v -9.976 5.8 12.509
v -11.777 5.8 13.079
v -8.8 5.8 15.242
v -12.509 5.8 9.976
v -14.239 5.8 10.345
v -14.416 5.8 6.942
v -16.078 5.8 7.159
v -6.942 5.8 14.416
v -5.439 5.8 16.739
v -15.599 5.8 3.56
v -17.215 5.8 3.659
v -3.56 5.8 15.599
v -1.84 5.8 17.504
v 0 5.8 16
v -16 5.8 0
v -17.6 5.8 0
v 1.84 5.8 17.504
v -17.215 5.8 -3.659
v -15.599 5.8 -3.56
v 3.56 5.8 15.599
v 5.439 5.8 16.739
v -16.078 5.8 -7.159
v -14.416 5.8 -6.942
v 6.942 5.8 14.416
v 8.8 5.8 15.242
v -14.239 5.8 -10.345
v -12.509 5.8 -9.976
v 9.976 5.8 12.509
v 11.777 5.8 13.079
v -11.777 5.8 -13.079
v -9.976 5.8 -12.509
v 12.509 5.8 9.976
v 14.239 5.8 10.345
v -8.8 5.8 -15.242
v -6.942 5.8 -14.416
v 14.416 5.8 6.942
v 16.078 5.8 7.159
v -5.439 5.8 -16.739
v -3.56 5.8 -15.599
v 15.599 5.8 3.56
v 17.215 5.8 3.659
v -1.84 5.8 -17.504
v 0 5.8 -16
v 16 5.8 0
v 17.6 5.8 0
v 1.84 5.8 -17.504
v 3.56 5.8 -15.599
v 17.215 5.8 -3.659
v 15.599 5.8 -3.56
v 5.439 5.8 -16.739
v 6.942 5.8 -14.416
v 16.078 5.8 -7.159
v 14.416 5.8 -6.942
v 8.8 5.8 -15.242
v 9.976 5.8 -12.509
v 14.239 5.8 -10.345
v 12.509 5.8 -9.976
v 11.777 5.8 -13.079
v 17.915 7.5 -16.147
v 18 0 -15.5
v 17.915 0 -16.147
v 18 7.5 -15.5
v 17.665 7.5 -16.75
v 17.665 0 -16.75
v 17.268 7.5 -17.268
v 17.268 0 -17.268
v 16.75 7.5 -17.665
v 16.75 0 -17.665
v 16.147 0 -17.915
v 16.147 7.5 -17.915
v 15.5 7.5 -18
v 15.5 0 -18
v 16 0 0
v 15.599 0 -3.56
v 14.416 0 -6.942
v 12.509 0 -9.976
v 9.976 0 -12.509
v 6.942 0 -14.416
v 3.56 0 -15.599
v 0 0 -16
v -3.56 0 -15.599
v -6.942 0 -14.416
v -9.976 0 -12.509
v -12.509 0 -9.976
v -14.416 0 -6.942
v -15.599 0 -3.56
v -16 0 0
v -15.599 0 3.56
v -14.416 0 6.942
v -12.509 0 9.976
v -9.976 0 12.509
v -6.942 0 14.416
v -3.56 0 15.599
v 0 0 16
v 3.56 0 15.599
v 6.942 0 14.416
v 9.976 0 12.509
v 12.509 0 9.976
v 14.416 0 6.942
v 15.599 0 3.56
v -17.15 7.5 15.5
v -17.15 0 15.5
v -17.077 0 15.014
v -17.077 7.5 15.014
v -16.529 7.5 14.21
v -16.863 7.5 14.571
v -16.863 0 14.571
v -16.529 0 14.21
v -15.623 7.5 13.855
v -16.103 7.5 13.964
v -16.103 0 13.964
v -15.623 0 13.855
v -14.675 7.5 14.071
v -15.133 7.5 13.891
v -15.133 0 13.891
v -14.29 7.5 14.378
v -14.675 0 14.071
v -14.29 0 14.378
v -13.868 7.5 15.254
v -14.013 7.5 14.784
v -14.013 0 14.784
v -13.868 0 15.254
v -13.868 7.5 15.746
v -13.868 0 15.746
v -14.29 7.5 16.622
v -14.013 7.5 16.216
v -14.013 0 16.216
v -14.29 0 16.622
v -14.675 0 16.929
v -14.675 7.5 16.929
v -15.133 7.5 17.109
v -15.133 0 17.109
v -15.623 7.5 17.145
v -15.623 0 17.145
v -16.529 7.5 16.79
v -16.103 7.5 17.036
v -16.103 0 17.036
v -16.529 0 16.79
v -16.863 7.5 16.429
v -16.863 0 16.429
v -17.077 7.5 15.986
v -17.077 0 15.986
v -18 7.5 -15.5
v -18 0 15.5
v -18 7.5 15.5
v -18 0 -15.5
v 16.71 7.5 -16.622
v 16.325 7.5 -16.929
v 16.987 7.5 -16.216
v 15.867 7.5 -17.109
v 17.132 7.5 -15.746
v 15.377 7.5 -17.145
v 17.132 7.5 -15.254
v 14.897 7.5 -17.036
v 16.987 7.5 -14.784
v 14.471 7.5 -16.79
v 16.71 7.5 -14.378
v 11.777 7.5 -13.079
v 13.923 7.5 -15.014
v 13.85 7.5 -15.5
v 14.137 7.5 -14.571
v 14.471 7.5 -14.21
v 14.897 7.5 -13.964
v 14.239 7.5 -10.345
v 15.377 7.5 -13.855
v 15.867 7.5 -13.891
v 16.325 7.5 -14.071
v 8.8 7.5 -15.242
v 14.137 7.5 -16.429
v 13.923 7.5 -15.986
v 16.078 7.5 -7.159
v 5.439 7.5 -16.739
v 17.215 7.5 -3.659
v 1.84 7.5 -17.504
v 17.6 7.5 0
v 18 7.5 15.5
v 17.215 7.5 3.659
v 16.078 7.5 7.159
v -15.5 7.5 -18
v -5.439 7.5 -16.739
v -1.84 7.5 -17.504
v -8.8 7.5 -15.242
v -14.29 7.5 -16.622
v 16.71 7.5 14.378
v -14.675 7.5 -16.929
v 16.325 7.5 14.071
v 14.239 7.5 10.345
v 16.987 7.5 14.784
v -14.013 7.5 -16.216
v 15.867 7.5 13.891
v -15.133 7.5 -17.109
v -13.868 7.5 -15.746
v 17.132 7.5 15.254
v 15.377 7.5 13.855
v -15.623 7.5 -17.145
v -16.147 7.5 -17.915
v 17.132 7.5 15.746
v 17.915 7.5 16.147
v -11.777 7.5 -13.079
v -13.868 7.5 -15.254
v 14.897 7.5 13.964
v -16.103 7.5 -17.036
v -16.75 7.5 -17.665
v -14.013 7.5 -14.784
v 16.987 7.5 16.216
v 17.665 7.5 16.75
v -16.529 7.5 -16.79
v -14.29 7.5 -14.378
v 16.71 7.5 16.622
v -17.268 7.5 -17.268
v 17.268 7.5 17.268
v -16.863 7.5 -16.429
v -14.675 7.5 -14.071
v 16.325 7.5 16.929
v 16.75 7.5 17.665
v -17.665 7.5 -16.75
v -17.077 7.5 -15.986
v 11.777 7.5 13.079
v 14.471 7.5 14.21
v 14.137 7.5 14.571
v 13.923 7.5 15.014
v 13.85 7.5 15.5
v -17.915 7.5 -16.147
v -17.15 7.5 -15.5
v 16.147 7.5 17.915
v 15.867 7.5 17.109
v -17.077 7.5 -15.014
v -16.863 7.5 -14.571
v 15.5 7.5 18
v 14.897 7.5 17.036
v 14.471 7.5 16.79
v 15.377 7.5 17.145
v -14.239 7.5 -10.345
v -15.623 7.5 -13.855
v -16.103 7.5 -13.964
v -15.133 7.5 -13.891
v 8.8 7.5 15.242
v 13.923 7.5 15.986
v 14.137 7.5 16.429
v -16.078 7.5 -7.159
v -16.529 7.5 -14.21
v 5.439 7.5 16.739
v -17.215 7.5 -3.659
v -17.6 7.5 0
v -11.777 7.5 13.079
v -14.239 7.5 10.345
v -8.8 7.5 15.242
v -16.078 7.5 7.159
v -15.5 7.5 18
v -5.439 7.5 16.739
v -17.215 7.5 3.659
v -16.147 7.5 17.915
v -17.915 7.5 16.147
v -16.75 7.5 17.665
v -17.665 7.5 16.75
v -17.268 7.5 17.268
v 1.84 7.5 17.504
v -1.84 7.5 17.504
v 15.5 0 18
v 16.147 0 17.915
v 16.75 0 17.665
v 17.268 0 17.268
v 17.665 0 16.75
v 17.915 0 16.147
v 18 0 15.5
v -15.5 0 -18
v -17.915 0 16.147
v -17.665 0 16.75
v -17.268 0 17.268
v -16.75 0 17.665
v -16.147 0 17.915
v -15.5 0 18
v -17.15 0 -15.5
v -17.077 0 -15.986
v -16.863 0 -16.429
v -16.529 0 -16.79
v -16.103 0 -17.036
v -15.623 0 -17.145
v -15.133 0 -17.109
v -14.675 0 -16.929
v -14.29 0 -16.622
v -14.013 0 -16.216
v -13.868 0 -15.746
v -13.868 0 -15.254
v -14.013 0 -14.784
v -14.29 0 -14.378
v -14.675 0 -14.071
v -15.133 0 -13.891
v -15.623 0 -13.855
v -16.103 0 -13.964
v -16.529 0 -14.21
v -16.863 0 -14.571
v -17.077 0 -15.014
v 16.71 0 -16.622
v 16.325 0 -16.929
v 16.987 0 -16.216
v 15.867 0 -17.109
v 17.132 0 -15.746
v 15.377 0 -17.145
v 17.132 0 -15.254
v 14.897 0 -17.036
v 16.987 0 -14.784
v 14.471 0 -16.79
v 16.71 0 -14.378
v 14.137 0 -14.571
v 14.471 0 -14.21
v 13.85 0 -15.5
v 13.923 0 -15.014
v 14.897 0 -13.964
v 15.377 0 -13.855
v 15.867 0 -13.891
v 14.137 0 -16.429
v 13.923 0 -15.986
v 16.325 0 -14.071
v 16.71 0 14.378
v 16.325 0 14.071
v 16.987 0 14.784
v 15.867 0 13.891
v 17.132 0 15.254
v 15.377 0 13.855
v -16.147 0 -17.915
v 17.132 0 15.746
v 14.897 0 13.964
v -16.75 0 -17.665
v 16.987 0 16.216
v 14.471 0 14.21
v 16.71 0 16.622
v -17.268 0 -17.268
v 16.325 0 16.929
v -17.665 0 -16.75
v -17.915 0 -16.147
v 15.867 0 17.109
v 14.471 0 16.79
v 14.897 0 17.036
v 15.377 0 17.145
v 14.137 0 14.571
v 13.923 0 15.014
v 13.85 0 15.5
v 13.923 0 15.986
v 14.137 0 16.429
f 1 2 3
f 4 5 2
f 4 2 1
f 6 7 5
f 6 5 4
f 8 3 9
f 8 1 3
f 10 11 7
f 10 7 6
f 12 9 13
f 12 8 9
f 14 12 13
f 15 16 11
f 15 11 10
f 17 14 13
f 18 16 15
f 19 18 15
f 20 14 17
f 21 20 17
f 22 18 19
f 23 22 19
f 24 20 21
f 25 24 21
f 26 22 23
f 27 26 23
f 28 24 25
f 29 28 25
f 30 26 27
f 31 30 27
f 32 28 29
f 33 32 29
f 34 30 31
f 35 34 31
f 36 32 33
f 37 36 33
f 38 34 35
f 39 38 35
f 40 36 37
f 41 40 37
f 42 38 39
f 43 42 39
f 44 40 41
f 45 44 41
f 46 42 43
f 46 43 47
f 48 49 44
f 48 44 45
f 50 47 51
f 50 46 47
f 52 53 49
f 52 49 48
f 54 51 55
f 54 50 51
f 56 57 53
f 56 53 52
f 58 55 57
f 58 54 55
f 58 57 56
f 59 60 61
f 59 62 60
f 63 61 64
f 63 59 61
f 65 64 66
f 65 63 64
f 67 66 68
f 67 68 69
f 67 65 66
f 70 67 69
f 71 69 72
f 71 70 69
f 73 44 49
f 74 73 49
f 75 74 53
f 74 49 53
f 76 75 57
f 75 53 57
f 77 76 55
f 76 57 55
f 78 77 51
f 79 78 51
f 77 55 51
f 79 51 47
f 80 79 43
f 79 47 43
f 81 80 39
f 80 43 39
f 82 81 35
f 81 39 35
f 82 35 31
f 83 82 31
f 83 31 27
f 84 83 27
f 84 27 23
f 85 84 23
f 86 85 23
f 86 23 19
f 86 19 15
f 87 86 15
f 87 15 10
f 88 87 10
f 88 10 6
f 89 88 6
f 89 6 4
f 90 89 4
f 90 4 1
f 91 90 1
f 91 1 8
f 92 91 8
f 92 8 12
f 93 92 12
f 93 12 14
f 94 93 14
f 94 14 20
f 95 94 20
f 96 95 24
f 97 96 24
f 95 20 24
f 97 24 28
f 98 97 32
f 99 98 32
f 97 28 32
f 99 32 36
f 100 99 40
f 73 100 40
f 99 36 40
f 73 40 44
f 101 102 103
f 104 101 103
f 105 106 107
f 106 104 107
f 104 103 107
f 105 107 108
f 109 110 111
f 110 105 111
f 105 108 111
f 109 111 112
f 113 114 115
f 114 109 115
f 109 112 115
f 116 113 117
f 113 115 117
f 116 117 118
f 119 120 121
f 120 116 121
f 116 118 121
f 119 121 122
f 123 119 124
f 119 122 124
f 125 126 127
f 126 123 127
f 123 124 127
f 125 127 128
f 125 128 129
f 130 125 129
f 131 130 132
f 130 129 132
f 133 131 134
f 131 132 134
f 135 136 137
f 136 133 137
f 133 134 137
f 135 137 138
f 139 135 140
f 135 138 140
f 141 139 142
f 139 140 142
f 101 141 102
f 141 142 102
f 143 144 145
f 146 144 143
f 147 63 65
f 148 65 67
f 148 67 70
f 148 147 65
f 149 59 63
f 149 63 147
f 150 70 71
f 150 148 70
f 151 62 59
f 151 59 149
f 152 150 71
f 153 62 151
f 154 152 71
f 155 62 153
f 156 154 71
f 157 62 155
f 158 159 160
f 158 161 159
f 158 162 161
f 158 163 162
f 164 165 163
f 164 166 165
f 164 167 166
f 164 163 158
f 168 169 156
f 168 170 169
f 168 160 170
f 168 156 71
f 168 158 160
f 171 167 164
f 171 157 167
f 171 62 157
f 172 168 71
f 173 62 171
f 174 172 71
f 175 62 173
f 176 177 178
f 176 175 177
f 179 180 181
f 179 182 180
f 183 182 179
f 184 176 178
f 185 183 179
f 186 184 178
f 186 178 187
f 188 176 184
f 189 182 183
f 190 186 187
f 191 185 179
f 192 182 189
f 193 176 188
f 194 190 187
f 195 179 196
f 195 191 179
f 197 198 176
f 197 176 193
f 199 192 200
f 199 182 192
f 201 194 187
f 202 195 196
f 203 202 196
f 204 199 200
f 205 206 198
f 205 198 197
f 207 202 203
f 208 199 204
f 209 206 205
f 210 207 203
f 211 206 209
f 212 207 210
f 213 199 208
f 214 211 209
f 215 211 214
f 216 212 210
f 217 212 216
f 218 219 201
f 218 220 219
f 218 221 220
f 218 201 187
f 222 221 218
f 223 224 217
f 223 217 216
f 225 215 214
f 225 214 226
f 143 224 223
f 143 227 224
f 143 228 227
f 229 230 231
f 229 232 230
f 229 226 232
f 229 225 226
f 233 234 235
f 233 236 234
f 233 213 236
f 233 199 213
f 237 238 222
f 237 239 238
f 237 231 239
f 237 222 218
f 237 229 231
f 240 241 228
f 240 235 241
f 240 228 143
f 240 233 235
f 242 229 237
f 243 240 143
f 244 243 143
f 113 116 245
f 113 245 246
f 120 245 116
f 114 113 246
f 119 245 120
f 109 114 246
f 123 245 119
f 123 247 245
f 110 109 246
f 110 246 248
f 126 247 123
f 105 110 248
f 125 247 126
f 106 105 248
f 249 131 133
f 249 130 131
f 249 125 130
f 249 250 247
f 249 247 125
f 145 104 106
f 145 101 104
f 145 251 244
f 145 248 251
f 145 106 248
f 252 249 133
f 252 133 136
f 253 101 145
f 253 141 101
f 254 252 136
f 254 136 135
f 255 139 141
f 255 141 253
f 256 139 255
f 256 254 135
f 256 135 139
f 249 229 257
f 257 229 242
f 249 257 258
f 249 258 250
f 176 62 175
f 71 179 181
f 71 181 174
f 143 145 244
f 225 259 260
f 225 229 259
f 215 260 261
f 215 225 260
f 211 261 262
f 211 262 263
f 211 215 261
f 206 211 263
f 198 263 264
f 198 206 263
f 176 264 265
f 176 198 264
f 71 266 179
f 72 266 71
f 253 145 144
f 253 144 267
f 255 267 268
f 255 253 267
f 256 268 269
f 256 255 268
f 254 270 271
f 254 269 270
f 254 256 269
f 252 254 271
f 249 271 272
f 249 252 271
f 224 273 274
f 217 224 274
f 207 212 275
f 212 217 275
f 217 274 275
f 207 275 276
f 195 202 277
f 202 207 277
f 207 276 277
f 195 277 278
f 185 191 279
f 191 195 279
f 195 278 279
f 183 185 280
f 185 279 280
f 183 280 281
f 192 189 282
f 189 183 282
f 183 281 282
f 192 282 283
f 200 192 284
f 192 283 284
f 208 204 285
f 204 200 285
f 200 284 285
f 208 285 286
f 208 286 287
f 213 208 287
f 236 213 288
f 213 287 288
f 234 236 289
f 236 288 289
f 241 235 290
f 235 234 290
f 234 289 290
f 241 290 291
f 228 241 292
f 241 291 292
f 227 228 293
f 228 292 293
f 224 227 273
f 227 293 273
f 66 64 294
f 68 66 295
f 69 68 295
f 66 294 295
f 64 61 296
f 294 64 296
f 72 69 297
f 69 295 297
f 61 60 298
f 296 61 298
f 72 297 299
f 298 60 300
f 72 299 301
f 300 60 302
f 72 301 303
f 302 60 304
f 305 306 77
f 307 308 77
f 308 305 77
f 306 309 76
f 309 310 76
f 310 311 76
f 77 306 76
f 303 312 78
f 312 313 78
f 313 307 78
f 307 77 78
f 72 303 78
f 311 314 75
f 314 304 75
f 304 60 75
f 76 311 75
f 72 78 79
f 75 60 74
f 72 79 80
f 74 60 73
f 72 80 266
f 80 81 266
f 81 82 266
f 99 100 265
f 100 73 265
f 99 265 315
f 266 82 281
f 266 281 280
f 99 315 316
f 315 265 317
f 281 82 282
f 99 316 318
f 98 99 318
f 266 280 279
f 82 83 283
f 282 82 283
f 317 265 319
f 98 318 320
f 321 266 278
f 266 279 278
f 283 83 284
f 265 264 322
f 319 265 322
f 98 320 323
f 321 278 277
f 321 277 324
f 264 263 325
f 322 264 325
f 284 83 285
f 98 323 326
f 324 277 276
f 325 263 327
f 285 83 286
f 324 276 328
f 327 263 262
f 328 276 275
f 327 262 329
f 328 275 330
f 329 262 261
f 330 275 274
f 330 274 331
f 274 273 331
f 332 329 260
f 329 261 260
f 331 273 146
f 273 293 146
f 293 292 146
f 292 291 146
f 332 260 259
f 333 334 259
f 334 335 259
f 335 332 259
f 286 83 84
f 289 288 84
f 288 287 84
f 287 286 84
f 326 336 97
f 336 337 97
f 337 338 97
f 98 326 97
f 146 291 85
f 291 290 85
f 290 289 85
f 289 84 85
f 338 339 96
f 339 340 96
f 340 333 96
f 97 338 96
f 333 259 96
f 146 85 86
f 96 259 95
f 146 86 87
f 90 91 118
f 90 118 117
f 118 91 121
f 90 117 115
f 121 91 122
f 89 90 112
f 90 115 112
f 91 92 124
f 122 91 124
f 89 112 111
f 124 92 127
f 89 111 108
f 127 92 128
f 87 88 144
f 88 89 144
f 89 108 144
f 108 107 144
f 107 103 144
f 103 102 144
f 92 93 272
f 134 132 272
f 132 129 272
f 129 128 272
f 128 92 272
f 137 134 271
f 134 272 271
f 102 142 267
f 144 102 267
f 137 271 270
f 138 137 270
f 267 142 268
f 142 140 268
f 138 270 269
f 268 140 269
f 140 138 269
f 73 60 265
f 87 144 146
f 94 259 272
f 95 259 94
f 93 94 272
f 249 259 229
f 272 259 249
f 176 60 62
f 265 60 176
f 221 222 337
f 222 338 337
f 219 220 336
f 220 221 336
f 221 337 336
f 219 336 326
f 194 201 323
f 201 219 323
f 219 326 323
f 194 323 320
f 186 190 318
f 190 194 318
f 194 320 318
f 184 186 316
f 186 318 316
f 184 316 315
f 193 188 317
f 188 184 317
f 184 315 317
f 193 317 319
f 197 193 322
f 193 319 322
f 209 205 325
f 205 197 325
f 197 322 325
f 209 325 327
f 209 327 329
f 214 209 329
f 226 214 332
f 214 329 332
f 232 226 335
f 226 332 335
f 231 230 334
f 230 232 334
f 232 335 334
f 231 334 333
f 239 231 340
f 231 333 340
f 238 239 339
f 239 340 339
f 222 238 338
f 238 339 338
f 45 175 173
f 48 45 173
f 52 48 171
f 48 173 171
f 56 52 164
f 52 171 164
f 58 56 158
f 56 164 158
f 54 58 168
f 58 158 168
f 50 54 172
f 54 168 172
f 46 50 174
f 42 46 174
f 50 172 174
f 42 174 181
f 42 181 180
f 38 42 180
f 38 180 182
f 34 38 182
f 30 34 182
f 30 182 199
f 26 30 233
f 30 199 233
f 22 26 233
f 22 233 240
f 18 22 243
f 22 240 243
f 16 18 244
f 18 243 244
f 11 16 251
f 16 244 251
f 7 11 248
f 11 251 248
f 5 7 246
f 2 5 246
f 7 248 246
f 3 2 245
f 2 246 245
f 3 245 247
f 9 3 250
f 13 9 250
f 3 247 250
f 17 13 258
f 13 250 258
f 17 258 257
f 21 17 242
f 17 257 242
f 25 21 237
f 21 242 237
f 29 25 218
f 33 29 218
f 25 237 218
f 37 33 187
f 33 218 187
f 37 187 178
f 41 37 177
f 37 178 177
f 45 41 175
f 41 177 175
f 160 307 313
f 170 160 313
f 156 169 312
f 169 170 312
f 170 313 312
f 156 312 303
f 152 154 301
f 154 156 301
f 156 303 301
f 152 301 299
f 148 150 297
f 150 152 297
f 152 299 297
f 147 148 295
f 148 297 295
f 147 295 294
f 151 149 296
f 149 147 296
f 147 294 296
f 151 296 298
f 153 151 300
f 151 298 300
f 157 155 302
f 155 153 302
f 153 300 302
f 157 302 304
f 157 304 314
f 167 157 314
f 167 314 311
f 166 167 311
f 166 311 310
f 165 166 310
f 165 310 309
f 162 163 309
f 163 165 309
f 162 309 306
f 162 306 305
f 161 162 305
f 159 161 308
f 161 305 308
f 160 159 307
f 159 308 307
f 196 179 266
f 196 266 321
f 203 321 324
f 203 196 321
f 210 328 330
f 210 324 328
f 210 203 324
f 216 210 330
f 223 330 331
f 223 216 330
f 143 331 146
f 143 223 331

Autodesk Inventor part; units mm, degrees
ref_plane "YZ Plane" through (0, 0, 0) normal (1, 0, 0) x (0, 1, 0)
ref_plane "XZ Plane" through (0, 0, 0) normal (0, 1, 0) x (-1, 0, 0)
ref_plane "XY Plane" through (0, 0, 0) normal (0, 0, 1) x (1, 0, 0)
sketch "Sketch1" plane through (0, 0, 0) normal (0, 1, 0) x (-1, 0, 0)
  line L0 (-18, 18) -> (18, 18)
  line L1 (18, 18) -> (18, -18)
  line L2 (18, -18) -> (-18, -18)
  line L3 (-18, -18) -> (-18, 18)
  line L4 (-18, 18) -> (18, -18) construction
  line L5 (18, 18) -> (-18, -18) construction
  circle A0 centre (0, 0) radius 16 construction
  circle A1 centre (15.5, 15.5) radius 1.65
  circle A2 centre (15.5, -15.5) radius 1.65
  circle A3 centre (-15.5, -15.5) radius 1.65
  circle A4 centre (-15.5, 15.5) radius 1.65
  circle A5 centre (15.5, 15.5) radius 2.5 construction
  circle A6 centre (15.5, -15.5) radius 2.5
  circle A7 centre (-15.5, -15.5) radius 2.5
  circle A8 centre (-15.5, 15.5) radius 2.5 construction
  point P0 (0, 0)
  dimension "d0" = 36
  dimension "d1" = 36
  dimension "d2" = 32
  dimension "d3" = 3.3
  dimension "d4" = 3.3
  dimension "d5" = 3.3
  dimension "d6" = 5
  dimension "d7" = 5
  dimension "d8" = 5
  dimension "d9" = 5
  dimension "d10" = 3.3
extrude "Extrusion1" add sketch "Sketch1" along normal blind 7.5
fillet "Fillet1" radius 2.5 4 edges at (18, 3.75, 18) (18, 3.75, -18) (-18, 3.75, -18) (-18, 3.75, 18)
sketch "Sketch2" plane through (0, 7.5, 0) normal (0, 1, 0) x (1, 0, 0)
  circle A0 centre (0, 0) radius 17.6
  dimension "d14" = 35.2
extrude "Extrusion2" cut sketch "Sketch2" against normal blind 1.7
sketch "Sketch3" plane through (0, 5.8, 0) normal (0, 1, 0) x (1, 0, 0)
  circle A0 centre (0, 0) radius 16
  dimension "d17" = 32
extrude "Extrusion3" cut sketch "Sketch3" against normal through all
properties part number "Bearing Block P1" material "Aluminum 6061"
